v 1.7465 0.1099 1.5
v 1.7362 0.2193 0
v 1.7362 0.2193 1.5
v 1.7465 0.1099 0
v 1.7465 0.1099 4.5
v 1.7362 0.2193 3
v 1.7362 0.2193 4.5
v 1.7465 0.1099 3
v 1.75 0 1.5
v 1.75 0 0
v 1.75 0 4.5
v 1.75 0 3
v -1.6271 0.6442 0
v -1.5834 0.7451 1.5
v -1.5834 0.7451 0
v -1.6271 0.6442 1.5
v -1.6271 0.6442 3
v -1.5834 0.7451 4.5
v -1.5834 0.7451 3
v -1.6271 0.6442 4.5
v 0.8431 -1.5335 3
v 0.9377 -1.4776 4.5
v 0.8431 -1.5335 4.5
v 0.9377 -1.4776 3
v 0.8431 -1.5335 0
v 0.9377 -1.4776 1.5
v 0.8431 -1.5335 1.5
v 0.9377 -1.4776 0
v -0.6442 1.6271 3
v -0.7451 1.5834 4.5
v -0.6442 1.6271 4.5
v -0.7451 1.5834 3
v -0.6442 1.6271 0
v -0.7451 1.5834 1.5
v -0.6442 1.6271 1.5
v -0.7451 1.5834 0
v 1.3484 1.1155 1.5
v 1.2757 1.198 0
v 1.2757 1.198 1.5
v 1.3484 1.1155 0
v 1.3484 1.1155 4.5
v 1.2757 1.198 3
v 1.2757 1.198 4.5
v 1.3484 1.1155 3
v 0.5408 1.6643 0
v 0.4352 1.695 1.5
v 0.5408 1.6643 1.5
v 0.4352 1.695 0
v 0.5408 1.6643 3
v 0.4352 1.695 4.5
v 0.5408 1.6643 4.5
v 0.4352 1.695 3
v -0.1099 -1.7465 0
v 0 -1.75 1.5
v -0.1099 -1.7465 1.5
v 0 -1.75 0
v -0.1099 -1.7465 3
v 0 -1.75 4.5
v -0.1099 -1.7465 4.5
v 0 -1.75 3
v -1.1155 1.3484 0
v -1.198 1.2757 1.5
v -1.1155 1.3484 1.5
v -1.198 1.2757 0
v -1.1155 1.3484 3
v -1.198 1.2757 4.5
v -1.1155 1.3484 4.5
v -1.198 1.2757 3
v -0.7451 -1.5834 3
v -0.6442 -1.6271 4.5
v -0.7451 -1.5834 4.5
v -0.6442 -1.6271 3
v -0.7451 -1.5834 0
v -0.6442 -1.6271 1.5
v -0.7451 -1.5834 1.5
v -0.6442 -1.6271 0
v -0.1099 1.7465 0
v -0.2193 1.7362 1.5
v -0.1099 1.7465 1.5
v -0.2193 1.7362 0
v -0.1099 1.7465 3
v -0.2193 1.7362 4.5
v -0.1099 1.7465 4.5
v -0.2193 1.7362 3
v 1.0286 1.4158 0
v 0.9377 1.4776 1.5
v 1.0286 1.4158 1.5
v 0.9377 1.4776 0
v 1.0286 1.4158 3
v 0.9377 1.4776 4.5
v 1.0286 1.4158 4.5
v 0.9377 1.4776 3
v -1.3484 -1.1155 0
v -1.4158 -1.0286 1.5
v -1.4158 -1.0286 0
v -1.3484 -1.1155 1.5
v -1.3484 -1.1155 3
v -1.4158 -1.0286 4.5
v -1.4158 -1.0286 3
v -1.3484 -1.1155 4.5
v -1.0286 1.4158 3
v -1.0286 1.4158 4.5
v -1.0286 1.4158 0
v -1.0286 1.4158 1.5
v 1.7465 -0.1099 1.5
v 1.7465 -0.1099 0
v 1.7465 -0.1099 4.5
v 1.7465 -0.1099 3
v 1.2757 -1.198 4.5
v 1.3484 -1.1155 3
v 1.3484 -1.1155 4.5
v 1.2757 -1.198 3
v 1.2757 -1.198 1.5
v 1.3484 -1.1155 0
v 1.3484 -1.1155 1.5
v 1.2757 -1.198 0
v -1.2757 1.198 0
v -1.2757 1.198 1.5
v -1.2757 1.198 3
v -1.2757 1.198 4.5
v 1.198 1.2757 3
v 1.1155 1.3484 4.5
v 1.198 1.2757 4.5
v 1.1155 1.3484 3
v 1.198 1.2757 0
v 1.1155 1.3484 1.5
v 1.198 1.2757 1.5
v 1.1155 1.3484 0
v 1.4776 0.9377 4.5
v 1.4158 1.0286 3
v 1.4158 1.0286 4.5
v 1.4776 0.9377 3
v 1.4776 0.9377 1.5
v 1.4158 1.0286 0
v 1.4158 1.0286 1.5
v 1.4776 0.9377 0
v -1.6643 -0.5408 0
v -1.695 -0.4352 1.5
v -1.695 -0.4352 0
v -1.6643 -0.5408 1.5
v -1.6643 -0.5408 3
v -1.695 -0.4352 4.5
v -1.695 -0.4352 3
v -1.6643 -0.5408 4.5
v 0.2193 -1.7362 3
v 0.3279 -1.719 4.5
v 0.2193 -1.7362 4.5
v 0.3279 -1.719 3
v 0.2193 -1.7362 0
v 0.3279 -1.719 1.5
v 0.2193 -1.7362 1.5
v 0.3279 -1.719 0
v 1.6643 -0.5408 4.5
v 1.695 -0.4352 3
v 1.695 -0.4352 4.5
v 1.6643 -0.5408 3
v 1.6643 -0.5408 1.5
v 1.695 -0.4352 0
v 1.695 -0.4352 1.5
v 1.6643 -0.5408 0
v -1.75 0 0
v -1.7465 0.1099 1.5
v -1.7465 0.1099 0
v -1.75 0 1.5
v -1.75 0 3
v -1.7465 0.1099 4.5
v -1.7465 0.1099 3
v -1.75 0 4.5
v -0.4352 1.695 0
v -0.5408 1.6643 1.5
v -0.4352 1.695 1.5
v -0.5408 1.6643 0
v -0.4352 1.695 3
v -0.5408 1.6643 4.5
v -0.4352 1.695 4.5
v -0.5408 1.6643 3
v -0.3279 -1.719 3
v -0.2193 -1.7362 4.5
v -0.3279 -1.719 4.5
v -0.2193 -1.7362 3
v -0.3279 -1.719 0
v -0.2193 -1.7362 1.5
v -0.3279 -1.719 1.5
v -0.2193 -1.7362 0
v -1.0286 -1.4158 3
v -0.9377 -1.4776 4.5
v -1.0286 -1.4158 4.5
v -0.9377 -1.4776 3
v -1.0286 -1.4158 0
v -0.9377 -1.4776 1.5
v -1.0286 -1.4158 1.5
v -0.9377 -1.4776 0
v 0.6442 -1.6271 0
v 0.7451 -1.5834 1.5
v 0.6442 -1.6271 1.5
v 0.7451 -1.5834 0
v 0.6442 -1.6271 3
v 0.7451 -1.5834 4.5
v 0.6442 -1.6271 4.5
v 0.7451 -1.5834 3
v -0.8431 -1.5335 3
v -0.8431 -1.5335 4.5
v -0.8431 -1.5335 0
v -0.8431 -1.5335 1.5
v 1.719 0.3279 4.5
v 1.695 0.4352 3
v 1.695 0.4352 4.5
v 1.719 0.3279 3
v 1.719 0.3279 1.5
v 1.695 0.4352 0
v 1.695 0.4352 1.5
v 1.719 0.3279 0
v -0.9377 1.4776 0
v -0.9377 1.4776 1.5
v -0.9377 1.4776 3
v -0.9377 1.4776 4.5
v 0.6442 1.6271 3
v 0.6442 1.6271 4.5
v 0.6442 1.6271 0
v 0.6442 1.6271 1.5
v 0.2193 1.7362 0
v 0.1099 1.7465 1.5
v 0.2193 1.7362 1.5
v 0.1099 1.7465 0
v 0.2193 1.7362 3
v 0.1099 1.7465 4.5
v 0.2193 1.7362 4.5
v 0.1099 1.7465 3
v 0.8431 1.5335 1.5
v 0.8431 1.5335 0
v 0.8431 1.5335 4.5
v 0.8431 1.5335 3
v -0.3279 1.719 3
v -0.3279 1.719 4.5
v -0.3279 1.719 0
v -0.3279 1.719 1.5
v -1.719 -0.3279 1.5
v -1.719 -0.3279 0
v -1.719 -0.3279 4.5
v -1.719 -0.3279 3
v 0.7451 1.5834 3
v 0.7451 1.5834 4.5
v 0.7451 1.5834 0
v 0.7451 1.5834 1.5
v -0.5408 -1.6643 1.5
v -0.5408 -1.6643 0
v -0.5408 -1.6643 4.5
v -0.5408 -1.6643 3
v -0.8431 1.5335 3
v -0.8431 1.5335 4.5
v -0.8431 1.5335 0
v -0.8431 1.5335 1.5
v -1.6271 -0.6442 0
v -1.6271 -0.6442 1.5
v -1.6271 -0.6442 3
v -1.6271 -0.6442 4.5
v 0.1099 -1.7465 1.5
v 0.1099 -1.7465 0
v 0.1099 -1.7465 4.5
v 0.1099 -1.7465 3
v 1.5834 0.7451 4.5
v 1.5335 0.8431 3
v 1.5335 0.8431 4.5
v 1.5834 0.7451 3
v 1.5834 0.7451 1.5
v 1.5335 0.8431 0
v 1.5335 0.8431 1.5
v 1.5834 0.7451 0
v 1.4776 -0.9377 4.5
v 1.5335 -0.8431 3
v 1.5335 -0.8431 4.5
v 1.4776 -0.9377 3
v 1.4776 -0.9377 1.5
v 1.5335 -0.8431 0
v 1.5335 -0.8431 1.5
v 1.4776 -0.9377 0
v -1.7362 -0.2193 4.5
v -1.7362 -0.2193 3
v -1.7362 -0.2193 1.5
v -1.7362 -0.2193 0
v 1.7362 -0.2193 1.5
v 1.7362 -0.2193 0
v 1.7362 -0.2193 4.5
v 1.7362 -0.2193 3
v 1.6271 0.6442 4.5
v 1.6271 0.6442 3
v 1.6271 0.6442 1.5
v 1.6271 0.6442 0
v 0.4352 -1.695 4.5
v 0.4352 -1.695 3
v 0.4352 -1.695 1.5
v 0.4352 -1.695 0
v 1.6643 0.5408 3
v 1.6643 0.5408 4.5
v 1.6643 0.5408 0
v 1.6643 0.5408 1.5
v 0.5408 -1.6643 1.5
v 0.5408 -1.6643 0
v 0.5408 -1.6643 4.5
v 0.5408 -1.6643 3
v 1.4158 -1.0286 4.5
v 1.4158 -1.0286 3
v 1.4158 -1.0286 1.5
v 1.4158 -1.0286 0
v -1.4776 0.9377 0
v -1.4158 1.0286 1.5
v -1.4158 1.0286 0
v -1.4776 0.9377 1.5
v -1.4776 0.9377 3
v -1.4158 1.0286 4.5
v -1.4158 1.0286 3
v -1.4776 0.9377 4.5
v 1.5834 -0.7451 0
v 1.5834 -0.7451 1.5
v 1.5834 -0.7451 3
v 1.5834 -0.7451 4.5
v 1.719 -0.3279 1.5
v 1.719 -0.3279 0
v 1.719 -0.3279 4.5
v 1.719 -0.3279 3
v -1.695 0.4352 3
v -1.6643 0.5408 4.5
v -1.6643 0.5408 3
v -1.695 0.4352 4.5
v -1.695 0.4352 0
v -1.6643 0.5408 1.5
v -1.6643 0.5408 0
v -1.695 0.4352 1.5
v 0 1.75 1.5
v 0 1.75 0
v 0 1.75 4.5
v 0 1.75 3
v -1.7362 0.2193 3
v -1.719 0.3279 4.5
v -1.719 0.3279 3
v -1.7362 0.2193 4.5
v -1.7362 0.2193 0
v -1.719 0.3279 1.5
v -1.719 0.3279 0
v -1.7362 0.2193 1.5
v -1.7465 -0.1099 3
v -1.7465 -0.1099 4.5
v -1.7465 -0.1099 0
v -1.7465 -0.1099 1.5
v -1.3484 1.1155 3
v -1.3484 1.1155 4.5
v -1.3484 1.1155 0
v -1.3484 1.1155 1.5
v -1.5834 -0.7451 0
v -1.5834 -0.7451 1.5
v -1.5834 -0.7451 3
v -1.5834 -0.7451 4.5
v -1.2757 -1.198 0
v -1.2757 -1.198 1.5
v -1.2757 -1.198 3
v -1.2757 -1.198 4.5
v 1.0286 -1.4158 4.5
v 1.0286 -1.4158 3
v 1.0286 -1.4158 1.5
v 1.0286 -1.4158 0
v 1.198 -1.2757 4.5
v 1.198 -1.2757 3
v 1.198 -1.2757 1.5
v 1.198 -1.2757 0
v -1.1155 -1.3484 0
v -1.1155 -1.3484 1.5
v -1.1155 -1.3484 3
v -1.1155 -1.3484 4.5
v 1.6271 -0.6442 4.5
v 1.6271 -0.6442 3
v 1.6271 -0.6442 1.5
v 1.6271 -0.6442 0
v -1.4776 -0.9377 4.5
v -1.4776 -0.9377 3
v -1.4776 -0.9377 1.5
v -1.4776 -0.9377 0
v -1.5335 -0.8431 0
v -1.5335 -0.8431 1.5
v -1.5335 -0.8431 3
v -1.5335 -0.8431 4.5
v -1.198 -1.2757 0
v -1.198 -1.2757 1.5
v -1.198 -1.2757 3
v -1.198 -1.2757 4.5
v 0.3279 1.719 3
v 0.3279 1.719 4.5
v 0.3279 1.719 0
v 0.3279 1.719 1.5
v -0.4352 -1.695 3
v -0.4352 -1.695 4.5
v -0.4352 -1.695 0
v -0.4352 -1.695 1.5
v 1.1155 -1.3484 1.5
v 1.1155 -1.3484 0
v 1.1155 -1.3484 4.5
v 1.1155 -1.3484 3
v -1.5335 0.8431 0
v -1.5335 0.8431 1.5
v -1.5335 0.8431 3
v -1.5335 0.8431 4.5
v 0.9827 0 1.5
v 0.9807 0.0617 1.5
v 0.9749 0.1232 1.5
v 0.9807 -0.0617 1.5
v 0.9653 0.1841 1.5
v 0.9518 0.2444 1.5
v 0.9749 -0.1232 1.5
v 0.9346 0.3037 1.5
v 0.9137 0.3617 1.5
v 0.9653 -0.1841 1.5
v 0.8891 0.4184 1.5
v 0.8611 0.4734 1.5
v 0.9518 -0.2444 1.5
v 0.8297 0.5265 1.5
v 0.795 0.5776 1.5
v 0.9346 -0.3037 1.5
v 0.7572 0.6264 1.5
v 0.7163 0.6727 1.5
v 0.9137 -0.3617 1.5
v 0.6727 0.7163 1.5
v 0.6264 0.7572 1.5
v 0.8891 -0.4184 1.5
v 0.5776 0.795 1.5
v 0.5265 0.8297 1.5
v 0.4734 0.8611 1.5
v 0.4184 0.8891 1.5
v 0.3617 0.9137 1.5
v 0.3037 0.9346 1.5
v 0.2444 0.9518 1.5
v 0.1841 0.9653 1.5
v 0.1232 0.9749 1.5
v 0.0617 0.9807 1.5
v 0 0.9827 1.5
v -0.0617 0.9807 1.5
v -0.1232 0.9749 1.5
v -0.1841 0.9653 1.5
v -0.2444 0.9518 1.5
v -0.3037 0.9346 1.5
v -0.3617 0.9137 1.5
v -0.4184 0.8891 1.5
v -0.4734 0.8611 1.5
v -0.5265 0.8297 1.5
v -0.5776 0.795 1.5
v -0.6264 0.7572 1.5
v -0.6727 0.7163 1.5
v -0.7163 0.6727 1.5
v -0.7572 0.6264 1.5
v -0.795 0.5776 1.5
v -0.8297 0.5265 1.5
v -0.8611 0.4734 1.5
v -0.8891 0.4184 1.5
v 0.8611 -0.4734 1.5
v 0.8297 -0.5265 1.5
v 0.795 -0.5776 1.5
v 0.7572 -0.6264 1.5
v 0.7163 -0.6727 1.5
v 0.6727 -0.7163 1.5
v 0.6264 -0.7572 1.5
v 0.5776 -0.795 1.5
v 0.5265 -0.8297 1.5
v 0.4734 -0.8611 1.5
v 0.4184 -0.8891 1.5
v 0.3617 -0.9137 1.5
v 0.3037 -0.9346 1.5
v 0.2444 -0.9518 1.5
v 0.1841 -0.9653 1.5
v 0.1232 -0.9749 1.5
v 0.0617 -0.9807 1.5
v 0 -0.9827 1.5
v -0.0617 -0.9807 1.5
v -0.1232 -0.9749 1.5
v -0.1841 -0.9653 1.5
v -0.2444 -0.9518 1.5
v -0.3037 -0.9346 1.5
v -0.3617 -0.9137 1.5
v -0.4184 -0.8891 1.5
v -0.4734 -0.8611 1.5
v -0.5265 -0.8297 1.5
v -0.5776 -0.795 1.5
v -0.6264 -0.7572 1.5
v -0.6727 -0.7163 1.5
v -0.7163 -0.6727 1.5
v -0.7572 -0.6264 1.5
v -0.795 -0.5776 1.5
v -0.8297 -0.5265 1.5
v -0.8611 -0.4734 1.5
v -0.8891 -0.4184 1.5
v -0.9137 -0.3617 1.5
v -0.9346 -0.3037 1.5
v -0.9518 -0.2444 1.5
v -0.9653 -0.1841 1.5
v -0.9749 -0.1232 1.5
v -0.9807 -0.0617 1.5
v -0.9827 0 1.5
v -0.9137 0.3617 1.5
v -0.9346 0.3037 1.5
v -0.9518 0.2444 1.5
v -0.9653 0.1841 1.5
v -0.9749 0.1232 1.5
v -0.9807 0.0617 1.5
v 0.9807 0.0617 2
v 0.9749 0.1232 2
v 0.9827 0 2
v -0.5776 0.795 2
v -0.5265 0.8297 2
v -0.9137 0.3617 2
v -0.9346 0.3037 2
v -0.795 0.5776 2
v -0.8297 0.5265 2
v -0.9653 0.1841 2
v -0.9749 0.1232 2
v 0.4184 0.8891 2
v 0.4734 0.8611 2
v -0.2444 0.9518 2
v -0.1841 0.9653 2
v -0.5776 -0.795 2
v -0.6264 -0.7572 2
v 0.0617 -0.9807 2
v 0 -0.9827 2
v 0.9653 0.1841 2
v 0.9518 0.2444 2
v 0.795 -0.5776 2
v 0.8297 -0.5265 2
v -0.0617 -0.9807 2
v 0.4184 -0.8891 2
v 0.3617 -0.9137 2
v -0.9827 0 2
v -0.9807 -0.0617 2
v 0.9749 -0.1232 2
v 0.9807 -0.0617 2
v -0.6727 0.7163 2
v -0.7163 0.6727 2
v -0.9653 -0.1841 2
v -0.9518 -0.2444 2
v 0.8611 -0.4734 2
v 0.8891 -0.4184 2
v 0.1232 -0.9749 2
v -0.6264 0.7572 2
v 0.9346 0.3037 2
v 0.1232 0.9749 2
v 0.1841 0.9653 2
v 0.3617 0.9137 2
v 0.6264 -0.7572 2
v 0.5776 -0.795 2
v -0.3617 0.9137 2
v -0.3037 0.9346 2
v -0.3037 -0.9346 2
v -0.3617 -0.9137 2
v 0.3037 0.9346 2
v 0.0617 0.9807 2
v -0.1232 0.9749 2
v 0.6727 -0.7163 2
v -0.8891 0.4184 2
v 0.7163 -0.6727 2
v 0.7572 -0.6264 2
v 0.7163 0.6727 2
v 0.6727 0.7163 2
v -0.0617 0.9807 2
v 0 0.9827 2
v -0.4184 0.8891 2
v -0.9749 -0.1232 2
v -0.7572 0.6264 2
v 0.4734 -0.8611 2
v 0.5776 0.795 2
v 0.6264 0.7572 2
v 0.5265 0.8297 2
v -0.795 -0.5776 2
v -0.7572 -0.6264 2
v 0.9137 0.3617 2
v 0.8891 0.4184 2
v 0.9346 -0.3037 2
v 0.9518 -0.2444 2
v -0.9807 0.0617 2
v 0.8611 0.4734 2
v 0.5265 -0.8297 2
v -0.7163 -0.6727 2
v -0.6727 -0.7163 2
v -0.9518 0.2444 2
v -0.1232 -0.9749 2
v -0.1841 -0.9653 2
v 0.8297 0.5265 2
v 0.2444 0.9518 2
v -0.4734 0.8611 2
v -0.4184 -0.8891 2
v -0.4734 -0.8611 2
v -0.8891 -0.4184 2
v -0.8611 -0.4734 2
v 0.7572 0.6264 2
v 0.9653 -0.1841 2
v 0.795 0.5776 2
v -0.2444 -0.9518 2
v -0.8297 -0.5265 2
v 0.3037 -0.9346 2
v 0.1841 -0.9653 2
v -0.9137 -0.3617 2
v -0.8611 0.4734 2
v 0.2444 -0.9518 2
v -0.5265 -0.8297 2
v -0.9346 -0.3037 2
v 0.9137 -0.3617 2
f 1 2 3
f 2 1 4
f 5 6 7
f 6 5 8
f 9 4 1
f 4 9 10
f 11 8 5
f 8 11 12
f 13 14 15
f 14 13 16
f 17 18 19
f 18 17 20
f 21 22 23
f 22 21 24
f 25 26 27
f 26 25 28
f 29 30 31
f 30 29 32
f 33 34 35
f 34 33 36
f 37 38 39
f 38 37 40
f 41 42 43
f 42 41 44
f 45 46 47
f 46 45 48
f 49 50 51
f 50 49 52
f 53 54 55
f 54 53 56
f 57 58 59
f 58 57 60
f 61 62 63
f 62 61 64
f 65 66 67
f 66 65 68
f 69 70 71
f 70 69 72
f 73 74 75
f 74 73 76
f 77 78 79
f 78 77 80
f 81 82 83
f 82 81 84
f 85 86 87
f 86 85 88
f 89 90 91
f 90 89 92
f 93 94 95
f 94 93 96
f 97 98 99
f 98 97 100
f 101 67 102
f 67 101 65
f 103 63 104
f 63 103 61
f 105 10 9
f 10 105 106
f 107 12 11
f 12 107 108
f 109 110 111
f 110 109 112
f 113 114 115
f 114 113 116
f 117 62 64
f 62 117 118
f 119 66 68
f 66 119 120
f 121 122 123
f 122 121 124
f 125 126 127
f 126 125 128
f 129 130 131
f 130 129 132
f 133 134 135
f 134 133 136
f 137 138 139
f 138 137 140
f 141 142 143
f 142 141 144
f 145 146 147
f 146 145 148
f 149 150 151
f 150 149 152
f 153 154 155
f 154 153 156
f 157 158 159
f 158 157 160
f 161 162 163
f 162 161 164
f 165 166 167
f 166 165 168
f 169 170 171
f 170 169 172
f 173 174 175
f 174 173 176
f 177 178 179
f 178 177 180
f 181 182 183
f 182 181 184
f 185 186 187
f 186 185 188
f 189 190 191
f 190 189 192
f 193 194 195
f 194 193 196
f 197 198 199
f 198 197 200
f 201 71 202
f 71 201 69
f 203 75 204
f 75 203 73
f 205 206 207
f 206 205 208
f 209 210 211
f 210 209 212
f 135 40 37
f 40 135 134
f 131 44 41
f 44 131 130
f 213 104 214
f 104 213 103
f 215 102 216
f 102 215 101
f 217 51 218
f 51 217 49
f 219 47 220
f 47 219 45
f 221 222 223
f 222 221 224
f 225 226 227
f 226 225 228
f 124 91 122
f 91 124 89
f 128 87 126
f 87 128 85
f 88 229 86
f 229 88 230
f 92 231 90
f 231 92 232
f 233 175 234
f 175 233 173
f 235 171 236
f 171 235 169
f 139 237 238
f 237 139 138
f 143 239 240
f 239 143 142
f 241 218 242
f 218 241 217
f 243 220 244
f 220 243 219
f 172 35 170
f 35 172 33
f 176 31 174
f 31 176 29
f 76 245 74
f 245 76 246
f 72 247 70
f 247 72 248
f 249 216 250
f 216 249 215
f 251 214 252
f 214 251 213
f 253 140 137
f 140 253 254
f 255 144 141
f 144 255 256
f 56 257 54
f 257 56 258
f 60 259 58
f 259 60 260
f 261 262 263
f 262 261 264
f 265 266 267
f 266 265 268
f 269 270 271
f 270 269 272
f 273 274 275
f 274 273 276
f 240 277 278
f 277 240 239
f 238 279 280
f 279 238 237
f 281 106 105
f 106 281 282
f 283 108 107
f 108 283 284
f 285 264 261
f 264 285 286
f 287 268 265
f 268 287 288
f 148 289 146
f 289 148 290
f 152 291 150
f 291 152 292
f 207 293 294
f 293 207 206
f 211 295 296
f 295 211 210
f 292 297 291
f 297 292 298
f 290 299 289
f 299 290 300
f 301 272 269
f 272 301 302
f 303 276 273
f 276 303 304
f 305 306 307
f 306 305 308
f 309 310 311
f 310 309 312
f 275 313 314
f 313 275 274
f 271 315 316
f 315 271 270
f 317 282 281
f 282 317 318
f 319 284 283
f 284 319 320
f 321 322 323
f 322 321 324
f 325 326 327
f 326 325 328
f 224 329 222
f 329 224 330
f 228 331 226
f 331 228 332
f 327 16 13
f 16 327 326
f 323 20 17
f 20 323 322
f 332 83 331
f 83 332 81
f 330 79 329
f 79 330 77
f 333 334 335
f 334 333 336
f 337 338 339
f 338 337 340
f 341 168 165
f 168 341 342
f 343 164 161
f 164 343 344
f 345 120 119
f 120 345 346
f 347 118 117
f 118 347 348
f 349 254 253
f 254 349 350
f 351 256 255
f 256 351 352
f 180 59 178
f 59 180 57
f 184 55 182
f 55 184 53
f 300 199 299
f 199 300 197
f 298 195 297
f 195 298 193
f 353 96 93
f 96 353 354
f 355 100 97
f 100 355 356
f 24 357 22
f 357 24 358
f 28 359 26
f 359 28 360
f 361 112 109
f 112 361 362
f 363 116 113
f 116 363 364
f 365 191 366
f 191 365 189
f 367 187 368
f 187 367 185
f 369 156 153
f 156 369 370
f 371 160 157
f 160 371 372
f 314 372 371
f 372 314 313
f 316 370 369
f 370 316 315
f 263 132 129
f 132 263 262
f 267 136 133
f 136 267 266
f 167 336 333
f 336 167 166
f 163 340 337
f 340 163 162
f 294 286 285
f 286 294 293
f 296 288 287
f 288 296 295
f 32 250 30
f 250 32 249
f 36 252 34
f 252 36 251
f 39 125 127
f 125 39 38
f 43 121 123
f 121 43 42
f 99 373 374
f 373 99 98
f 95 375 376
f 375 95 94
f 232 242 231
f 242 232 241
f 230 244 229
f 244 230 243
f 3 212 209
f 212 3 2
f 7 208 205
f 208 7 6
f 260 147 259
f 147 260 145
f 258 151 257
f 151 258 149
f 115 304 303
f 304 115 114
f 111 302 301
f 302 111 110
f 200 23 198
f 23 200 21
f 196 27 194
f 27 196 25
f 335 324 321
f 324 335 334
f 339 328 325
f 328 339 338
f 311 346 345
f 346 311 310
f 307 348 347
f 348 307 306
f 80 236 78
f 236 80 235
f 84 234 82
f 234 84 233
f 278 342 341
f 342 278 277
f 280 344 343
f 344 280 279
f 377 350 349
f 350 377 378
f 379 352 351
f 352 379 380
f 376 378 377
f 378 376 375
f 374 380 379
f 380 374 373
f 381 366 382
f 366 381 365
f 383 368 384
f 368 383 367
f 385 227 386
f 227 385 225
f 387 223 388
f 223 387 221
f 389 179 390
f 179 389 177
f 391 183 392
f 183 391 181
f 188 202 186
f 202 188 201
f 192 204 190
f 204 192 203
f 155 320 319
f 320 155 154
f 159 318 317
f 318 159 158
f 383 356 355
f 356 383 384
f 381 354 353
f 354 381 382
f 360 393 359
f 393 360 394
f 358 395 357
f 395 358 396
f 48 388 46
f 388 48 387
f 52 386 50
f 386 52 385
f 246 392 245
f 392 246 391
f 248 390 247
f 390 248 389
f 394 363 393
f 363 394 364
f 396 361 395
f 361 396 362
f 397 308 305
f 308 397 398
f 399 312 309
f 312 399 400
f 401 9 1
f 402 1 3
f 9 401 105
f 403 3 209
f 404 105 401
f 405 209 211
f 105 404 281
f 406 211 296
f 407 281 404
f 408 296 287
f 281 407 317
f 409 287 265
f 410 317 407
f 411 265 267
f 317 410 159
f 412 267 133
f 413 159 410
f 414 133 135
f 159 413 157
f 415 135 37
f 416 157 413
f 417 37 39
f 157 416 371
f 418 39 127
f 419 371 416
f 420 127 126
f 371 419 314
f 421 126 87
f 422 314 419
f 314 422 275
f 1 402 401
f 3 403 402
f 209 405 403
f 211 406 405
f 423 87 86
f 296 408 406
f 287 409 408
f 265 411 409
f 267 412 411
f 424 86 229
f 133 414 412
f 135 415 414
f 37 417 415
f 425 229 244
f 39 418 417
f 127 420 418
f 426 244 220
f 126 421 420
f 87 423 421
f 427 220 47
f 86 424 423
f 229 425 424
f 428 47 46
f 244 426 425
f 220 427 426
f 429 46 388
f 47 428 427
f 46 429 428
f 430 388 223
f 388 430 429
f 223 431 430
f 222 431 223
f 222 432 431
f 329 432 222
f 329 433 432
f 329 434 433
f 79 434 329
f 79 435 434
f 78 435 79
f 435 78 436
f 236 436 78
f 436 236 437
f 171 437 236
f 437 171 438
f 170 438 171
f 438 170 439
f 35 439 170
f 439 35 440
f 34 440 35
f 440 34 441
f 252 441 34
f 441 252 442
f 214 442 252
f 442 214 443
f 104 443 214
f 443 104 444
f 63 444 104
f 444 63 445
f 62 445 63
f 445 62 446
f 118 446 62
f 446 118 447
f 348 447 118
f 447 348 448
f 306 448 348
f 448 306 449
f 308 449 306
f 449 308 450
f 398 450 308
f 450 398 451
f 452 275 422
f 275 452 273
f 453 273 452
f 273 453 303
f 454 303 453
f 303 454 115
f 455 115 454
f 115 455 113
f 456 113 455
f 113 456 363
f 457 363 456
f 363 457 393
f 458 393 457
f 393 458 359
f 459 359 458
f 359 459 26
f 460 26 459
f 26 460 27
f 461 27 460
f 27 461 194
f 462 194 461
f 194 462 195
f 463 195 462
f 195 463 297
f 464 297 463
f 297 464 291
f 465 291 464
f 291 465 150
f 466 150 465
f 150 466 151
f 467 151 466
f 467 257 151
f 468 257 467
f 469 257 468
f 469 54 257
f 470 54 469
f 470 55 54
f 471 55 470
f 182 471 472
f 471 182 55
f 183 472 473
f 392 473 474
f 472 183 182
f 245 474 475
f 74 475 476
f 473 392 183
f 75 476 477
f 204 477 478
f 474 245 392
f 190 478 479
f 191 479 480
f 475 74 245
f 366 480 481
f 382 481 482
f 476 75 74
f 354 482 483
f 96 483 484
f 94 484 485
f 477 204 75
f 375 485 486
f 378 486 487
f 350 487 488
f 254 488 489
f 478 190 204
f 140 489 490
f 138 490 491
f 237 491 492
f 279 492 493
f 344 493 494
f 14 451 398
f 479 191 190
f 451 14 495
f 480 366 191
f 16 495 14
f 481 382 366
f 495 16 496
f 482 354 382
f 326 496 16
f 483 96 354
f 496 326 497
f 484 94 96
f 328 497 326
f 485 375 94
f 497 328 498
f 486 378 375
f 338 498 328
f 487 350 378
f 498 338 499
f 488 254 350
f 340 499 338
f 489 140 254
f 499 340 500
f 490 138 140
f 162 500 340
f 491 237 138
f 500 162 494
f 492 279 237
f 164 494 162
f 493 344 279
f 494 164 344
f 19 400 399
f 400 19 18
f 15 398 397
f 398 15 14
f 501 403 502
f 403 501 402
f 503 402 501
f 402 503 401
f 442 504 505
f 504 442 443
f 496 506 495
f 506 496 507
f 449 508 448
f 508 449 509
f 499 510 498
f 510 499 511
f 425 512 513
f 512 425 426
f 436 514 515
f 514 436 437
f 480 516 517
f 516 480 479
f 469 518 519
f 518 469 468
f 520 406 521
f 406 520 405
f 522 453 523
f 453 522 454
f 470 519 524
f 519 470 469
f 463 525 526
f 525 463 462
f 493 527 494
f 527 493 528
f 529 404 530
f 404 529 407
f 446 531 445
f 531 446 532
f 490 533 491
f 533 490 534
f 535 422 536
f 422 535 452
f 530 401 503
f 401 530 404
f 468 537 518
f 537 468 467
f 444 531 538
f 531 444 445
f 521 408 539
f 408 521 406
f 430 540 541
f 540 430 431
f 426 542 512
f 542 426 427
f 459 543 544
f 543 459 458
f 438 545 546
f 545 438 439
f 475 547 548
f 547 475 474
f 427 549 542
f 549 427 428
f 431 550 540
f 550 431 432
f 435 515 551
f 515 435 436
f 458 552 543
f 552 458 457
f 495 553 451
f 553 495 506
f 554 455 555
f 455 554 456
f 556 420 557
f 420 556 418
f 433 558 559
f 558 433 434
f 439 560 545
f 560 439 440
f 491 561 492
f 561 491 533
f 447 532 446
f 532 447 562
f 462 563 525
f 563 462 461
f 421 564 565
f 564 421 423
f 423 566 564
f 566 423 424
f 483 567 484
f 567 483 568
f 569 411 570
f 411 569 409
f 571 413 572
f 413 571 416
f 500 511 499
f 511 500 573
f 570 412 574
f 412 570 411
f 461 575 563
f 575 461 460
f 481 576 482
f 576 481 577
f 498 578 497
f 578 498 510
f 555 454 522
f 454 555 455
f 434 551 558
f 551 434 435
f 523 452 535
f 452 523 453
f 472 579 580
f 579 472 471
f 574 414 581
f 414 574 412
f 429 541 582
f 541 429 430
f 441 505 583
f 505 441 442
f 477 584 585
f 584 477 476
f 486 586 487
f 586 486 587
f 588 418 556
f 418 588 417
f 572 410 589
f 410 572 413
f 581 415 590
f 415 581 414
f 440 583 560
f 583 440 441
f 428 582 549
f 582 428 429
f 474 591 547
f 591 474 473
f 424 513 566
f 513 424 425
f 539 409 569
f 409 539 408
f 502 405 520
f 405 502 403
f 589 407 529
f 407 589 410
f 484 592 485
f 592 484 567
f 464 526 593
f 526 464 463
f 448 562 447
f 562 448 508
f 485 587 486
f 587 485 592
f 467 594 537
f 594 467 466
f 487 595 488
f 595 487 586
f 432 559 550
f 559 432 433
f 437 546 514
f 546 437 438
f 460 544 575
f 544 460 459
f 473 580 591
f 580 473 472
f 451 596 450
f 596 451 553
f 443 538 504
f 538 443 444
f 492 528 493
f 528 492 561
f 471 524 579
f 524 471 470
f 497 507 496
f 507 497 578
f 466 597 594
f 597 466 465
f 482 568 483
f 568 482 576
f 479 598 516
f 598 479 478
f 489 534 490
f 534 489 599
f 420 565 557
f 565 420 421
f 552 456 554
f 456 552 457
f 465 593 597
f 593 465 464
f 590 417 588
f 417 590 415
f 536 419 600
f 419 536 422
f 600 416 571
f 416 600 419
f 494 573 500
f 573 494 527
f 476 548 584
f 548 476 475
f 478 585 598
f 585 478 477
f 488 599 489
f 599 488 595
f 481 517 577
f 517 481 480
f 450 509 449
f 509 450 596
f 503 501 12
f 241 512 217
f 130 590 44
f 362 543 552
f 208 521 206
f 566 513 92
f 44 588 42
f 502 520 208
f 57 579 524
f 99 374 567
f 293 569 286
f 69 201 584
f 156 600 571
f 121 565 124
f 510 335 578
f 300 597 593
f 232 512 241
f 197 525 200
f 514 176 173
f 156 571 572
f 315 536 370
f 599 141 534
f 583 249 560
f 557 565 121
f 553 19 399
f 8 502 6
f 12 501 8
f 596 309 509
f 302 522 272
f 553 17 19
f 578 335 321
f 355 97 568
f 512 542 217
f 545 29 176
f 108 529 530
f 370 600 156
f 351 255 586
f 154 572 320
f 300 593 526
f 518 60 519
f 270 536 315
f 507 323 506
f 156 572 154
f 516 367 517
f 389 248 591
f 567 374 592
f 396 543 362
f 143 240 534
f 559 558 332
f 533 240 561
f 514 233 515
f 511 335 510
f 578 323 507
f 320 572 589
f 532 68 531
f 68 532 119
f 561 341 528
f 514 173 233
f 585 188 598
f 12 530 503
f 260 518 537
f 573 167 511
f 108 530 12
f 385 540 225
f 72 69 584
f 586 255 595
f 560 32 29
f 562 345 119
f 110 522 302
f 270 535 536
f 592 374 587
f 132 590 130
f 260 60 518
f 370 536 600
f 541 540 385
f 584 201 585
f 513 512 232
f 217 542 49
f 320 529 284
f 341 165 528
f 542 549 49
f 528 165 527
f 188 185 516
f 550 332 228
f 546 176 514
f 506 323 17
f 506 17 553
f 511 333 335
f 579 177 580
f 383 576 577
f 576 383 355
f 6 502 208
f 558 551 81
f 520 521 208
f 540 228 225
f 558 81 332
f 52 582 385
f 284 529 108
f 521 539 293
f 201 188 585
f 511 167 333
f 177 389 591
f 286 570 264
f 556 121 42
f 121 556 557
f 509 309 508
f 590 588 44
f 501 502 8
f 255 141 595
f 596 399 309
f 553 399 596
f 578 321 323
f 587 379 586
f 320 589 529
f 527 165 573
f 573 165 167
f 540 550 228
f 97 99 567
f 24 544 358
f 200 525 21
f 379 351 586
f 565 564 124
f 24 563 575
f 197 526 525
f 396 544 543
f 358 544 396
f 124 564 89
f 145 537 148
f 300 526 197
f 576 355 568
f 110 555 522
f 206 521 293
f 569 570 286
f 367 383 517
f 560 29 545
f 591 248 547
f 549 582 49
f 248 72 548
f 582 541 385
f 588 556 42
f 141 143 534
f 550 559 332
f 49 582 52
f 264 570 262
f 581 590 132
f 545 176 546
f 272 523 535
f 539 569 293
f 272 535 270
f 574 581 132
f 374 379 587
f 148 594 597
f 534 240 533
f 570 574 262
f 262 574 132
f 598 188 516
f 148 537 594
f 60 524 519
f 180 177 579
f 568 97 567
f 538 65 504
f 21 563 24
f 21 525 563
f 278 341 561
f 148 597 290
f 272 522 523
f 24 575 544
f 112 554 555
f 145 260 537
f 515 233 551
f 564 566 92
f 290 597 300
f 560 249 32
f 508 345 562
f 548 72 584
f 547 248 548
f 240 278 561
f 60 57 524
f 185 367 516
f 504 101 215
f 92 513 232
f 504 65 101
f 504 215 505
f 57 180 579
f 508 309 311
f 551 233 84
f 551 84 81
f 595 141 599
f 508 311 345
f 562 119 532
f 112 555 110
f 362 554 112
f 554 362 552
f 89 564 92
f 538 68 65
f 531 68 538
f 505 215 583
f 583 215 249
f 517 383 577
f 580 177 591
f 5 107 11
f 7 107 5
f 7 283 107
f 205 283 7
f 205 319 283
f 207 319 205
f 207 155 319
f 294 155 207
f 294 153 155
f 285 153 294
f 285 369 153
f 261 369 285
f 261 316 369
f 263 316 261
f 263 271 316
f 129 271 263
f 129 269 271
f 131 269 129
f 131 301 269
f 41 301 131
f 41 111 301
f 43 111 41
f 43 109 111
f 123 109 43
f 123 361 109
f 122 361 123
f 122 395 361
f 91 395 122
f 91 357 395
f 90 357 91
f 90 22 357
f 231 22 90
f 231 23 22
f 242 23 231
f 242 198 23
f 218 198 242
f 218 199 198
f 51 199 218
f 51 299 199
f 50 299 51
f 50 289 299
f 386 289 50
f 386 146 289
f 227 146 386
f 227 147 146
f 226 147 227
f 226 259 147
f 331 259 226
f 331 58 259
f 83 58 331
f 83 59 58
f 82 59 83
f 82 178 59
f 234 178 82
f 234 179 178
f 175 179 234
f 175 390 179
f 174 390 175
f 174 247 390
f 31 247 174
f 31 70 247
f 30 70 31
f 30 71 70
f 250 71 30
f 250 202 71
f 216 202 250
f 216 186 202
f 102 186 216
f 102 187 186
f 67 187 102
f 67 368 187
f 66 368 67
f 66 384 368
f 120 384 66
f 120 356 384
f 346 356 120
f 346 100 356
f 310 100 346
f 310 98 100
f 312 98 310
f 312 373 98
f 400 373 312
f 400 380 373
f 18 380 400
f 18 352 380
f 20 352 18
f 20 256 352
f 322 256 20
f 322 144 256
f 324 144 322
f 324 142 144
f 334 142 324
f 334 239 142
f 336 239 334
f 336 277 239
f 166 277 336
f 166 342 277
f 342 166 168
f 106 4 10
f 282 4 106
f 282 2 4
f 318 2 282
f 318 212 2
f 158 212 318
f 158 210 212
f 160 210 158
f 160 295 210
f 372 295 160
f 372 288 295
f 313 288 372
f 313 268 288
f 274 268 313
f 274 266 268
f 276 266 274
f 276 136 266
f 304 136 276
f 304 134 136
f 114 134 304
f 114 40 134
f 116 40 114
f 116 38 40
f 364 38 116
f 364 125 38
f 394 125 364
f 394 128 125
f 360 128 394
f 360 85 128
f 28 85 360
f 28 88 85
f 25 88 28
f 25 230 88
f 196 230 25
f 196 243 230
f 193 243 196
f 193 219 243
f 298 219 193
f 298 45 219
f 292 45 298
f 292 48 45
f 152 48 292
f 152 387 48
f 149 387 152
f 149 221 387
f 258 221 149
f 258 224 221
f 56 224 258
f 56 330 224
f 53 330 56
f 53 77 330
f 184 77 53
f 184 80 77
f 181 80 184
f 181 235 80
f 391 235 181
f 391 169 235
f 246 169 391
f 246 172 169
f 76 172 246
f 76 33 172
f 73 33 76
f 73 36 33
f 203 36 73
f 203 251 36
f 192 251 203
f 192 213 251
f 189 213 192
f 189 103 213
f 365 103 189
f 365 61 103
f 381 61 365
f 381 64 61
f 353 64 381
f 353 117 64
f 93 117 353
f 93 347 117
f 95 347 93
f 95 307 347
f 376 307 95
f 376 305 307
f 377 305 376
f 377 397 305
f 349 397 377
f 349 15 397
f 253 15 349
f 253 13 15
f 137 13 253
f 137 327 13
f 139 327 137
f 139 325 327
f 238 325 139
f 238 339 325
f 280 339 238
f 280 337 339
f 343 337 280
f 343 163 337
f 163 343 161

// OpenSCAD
//Outer radius of the peg the clip will attach to
pegRadius = 1.75;
//Thickness of the clip.
clipThickness = 1.5;
//Bevel angle from vertical of the clip and peg notch.  The steeper the angle, the more holding power and thinner notch in your peg, but the harder it is to print the peg without support.  Supports are bad.
bevelAngle = 37.5;
//Thickness of the clip before it starts beveling.  This can be 0 for a sharp-edged clip, or greater than the thickness for a clip with no bevel at all.
bevelStart = .5;

offset = ((clipThickness-bevelStart) / tan((90-bevelAngle)));

//1.56321 - .1;


//Number of sides to make it "round".  I like very round, so I use 100, but less round renders faster.
$fn=100;

//jump = 10*ceil(outerRadius * 3 / 10);

difference() {
	cylinder(
		h=clipThickness*3,
		r=pegRadius
	);
	translate([0, 0, clipThickness]) {
		difference() {
			cylinder(
				h=clipThickness,
				r=pegRadius
			);
			cylinder(
				h=bevelStart,
				r=pegRadius-offset
			);
			translate([0, 0, bevelStart]) {
				cylinder(
					h=clipThickness - bevelStart,
					r1=pegRadius - offset,
					r2=pegRadius
				);
			}
		}
	}
}
